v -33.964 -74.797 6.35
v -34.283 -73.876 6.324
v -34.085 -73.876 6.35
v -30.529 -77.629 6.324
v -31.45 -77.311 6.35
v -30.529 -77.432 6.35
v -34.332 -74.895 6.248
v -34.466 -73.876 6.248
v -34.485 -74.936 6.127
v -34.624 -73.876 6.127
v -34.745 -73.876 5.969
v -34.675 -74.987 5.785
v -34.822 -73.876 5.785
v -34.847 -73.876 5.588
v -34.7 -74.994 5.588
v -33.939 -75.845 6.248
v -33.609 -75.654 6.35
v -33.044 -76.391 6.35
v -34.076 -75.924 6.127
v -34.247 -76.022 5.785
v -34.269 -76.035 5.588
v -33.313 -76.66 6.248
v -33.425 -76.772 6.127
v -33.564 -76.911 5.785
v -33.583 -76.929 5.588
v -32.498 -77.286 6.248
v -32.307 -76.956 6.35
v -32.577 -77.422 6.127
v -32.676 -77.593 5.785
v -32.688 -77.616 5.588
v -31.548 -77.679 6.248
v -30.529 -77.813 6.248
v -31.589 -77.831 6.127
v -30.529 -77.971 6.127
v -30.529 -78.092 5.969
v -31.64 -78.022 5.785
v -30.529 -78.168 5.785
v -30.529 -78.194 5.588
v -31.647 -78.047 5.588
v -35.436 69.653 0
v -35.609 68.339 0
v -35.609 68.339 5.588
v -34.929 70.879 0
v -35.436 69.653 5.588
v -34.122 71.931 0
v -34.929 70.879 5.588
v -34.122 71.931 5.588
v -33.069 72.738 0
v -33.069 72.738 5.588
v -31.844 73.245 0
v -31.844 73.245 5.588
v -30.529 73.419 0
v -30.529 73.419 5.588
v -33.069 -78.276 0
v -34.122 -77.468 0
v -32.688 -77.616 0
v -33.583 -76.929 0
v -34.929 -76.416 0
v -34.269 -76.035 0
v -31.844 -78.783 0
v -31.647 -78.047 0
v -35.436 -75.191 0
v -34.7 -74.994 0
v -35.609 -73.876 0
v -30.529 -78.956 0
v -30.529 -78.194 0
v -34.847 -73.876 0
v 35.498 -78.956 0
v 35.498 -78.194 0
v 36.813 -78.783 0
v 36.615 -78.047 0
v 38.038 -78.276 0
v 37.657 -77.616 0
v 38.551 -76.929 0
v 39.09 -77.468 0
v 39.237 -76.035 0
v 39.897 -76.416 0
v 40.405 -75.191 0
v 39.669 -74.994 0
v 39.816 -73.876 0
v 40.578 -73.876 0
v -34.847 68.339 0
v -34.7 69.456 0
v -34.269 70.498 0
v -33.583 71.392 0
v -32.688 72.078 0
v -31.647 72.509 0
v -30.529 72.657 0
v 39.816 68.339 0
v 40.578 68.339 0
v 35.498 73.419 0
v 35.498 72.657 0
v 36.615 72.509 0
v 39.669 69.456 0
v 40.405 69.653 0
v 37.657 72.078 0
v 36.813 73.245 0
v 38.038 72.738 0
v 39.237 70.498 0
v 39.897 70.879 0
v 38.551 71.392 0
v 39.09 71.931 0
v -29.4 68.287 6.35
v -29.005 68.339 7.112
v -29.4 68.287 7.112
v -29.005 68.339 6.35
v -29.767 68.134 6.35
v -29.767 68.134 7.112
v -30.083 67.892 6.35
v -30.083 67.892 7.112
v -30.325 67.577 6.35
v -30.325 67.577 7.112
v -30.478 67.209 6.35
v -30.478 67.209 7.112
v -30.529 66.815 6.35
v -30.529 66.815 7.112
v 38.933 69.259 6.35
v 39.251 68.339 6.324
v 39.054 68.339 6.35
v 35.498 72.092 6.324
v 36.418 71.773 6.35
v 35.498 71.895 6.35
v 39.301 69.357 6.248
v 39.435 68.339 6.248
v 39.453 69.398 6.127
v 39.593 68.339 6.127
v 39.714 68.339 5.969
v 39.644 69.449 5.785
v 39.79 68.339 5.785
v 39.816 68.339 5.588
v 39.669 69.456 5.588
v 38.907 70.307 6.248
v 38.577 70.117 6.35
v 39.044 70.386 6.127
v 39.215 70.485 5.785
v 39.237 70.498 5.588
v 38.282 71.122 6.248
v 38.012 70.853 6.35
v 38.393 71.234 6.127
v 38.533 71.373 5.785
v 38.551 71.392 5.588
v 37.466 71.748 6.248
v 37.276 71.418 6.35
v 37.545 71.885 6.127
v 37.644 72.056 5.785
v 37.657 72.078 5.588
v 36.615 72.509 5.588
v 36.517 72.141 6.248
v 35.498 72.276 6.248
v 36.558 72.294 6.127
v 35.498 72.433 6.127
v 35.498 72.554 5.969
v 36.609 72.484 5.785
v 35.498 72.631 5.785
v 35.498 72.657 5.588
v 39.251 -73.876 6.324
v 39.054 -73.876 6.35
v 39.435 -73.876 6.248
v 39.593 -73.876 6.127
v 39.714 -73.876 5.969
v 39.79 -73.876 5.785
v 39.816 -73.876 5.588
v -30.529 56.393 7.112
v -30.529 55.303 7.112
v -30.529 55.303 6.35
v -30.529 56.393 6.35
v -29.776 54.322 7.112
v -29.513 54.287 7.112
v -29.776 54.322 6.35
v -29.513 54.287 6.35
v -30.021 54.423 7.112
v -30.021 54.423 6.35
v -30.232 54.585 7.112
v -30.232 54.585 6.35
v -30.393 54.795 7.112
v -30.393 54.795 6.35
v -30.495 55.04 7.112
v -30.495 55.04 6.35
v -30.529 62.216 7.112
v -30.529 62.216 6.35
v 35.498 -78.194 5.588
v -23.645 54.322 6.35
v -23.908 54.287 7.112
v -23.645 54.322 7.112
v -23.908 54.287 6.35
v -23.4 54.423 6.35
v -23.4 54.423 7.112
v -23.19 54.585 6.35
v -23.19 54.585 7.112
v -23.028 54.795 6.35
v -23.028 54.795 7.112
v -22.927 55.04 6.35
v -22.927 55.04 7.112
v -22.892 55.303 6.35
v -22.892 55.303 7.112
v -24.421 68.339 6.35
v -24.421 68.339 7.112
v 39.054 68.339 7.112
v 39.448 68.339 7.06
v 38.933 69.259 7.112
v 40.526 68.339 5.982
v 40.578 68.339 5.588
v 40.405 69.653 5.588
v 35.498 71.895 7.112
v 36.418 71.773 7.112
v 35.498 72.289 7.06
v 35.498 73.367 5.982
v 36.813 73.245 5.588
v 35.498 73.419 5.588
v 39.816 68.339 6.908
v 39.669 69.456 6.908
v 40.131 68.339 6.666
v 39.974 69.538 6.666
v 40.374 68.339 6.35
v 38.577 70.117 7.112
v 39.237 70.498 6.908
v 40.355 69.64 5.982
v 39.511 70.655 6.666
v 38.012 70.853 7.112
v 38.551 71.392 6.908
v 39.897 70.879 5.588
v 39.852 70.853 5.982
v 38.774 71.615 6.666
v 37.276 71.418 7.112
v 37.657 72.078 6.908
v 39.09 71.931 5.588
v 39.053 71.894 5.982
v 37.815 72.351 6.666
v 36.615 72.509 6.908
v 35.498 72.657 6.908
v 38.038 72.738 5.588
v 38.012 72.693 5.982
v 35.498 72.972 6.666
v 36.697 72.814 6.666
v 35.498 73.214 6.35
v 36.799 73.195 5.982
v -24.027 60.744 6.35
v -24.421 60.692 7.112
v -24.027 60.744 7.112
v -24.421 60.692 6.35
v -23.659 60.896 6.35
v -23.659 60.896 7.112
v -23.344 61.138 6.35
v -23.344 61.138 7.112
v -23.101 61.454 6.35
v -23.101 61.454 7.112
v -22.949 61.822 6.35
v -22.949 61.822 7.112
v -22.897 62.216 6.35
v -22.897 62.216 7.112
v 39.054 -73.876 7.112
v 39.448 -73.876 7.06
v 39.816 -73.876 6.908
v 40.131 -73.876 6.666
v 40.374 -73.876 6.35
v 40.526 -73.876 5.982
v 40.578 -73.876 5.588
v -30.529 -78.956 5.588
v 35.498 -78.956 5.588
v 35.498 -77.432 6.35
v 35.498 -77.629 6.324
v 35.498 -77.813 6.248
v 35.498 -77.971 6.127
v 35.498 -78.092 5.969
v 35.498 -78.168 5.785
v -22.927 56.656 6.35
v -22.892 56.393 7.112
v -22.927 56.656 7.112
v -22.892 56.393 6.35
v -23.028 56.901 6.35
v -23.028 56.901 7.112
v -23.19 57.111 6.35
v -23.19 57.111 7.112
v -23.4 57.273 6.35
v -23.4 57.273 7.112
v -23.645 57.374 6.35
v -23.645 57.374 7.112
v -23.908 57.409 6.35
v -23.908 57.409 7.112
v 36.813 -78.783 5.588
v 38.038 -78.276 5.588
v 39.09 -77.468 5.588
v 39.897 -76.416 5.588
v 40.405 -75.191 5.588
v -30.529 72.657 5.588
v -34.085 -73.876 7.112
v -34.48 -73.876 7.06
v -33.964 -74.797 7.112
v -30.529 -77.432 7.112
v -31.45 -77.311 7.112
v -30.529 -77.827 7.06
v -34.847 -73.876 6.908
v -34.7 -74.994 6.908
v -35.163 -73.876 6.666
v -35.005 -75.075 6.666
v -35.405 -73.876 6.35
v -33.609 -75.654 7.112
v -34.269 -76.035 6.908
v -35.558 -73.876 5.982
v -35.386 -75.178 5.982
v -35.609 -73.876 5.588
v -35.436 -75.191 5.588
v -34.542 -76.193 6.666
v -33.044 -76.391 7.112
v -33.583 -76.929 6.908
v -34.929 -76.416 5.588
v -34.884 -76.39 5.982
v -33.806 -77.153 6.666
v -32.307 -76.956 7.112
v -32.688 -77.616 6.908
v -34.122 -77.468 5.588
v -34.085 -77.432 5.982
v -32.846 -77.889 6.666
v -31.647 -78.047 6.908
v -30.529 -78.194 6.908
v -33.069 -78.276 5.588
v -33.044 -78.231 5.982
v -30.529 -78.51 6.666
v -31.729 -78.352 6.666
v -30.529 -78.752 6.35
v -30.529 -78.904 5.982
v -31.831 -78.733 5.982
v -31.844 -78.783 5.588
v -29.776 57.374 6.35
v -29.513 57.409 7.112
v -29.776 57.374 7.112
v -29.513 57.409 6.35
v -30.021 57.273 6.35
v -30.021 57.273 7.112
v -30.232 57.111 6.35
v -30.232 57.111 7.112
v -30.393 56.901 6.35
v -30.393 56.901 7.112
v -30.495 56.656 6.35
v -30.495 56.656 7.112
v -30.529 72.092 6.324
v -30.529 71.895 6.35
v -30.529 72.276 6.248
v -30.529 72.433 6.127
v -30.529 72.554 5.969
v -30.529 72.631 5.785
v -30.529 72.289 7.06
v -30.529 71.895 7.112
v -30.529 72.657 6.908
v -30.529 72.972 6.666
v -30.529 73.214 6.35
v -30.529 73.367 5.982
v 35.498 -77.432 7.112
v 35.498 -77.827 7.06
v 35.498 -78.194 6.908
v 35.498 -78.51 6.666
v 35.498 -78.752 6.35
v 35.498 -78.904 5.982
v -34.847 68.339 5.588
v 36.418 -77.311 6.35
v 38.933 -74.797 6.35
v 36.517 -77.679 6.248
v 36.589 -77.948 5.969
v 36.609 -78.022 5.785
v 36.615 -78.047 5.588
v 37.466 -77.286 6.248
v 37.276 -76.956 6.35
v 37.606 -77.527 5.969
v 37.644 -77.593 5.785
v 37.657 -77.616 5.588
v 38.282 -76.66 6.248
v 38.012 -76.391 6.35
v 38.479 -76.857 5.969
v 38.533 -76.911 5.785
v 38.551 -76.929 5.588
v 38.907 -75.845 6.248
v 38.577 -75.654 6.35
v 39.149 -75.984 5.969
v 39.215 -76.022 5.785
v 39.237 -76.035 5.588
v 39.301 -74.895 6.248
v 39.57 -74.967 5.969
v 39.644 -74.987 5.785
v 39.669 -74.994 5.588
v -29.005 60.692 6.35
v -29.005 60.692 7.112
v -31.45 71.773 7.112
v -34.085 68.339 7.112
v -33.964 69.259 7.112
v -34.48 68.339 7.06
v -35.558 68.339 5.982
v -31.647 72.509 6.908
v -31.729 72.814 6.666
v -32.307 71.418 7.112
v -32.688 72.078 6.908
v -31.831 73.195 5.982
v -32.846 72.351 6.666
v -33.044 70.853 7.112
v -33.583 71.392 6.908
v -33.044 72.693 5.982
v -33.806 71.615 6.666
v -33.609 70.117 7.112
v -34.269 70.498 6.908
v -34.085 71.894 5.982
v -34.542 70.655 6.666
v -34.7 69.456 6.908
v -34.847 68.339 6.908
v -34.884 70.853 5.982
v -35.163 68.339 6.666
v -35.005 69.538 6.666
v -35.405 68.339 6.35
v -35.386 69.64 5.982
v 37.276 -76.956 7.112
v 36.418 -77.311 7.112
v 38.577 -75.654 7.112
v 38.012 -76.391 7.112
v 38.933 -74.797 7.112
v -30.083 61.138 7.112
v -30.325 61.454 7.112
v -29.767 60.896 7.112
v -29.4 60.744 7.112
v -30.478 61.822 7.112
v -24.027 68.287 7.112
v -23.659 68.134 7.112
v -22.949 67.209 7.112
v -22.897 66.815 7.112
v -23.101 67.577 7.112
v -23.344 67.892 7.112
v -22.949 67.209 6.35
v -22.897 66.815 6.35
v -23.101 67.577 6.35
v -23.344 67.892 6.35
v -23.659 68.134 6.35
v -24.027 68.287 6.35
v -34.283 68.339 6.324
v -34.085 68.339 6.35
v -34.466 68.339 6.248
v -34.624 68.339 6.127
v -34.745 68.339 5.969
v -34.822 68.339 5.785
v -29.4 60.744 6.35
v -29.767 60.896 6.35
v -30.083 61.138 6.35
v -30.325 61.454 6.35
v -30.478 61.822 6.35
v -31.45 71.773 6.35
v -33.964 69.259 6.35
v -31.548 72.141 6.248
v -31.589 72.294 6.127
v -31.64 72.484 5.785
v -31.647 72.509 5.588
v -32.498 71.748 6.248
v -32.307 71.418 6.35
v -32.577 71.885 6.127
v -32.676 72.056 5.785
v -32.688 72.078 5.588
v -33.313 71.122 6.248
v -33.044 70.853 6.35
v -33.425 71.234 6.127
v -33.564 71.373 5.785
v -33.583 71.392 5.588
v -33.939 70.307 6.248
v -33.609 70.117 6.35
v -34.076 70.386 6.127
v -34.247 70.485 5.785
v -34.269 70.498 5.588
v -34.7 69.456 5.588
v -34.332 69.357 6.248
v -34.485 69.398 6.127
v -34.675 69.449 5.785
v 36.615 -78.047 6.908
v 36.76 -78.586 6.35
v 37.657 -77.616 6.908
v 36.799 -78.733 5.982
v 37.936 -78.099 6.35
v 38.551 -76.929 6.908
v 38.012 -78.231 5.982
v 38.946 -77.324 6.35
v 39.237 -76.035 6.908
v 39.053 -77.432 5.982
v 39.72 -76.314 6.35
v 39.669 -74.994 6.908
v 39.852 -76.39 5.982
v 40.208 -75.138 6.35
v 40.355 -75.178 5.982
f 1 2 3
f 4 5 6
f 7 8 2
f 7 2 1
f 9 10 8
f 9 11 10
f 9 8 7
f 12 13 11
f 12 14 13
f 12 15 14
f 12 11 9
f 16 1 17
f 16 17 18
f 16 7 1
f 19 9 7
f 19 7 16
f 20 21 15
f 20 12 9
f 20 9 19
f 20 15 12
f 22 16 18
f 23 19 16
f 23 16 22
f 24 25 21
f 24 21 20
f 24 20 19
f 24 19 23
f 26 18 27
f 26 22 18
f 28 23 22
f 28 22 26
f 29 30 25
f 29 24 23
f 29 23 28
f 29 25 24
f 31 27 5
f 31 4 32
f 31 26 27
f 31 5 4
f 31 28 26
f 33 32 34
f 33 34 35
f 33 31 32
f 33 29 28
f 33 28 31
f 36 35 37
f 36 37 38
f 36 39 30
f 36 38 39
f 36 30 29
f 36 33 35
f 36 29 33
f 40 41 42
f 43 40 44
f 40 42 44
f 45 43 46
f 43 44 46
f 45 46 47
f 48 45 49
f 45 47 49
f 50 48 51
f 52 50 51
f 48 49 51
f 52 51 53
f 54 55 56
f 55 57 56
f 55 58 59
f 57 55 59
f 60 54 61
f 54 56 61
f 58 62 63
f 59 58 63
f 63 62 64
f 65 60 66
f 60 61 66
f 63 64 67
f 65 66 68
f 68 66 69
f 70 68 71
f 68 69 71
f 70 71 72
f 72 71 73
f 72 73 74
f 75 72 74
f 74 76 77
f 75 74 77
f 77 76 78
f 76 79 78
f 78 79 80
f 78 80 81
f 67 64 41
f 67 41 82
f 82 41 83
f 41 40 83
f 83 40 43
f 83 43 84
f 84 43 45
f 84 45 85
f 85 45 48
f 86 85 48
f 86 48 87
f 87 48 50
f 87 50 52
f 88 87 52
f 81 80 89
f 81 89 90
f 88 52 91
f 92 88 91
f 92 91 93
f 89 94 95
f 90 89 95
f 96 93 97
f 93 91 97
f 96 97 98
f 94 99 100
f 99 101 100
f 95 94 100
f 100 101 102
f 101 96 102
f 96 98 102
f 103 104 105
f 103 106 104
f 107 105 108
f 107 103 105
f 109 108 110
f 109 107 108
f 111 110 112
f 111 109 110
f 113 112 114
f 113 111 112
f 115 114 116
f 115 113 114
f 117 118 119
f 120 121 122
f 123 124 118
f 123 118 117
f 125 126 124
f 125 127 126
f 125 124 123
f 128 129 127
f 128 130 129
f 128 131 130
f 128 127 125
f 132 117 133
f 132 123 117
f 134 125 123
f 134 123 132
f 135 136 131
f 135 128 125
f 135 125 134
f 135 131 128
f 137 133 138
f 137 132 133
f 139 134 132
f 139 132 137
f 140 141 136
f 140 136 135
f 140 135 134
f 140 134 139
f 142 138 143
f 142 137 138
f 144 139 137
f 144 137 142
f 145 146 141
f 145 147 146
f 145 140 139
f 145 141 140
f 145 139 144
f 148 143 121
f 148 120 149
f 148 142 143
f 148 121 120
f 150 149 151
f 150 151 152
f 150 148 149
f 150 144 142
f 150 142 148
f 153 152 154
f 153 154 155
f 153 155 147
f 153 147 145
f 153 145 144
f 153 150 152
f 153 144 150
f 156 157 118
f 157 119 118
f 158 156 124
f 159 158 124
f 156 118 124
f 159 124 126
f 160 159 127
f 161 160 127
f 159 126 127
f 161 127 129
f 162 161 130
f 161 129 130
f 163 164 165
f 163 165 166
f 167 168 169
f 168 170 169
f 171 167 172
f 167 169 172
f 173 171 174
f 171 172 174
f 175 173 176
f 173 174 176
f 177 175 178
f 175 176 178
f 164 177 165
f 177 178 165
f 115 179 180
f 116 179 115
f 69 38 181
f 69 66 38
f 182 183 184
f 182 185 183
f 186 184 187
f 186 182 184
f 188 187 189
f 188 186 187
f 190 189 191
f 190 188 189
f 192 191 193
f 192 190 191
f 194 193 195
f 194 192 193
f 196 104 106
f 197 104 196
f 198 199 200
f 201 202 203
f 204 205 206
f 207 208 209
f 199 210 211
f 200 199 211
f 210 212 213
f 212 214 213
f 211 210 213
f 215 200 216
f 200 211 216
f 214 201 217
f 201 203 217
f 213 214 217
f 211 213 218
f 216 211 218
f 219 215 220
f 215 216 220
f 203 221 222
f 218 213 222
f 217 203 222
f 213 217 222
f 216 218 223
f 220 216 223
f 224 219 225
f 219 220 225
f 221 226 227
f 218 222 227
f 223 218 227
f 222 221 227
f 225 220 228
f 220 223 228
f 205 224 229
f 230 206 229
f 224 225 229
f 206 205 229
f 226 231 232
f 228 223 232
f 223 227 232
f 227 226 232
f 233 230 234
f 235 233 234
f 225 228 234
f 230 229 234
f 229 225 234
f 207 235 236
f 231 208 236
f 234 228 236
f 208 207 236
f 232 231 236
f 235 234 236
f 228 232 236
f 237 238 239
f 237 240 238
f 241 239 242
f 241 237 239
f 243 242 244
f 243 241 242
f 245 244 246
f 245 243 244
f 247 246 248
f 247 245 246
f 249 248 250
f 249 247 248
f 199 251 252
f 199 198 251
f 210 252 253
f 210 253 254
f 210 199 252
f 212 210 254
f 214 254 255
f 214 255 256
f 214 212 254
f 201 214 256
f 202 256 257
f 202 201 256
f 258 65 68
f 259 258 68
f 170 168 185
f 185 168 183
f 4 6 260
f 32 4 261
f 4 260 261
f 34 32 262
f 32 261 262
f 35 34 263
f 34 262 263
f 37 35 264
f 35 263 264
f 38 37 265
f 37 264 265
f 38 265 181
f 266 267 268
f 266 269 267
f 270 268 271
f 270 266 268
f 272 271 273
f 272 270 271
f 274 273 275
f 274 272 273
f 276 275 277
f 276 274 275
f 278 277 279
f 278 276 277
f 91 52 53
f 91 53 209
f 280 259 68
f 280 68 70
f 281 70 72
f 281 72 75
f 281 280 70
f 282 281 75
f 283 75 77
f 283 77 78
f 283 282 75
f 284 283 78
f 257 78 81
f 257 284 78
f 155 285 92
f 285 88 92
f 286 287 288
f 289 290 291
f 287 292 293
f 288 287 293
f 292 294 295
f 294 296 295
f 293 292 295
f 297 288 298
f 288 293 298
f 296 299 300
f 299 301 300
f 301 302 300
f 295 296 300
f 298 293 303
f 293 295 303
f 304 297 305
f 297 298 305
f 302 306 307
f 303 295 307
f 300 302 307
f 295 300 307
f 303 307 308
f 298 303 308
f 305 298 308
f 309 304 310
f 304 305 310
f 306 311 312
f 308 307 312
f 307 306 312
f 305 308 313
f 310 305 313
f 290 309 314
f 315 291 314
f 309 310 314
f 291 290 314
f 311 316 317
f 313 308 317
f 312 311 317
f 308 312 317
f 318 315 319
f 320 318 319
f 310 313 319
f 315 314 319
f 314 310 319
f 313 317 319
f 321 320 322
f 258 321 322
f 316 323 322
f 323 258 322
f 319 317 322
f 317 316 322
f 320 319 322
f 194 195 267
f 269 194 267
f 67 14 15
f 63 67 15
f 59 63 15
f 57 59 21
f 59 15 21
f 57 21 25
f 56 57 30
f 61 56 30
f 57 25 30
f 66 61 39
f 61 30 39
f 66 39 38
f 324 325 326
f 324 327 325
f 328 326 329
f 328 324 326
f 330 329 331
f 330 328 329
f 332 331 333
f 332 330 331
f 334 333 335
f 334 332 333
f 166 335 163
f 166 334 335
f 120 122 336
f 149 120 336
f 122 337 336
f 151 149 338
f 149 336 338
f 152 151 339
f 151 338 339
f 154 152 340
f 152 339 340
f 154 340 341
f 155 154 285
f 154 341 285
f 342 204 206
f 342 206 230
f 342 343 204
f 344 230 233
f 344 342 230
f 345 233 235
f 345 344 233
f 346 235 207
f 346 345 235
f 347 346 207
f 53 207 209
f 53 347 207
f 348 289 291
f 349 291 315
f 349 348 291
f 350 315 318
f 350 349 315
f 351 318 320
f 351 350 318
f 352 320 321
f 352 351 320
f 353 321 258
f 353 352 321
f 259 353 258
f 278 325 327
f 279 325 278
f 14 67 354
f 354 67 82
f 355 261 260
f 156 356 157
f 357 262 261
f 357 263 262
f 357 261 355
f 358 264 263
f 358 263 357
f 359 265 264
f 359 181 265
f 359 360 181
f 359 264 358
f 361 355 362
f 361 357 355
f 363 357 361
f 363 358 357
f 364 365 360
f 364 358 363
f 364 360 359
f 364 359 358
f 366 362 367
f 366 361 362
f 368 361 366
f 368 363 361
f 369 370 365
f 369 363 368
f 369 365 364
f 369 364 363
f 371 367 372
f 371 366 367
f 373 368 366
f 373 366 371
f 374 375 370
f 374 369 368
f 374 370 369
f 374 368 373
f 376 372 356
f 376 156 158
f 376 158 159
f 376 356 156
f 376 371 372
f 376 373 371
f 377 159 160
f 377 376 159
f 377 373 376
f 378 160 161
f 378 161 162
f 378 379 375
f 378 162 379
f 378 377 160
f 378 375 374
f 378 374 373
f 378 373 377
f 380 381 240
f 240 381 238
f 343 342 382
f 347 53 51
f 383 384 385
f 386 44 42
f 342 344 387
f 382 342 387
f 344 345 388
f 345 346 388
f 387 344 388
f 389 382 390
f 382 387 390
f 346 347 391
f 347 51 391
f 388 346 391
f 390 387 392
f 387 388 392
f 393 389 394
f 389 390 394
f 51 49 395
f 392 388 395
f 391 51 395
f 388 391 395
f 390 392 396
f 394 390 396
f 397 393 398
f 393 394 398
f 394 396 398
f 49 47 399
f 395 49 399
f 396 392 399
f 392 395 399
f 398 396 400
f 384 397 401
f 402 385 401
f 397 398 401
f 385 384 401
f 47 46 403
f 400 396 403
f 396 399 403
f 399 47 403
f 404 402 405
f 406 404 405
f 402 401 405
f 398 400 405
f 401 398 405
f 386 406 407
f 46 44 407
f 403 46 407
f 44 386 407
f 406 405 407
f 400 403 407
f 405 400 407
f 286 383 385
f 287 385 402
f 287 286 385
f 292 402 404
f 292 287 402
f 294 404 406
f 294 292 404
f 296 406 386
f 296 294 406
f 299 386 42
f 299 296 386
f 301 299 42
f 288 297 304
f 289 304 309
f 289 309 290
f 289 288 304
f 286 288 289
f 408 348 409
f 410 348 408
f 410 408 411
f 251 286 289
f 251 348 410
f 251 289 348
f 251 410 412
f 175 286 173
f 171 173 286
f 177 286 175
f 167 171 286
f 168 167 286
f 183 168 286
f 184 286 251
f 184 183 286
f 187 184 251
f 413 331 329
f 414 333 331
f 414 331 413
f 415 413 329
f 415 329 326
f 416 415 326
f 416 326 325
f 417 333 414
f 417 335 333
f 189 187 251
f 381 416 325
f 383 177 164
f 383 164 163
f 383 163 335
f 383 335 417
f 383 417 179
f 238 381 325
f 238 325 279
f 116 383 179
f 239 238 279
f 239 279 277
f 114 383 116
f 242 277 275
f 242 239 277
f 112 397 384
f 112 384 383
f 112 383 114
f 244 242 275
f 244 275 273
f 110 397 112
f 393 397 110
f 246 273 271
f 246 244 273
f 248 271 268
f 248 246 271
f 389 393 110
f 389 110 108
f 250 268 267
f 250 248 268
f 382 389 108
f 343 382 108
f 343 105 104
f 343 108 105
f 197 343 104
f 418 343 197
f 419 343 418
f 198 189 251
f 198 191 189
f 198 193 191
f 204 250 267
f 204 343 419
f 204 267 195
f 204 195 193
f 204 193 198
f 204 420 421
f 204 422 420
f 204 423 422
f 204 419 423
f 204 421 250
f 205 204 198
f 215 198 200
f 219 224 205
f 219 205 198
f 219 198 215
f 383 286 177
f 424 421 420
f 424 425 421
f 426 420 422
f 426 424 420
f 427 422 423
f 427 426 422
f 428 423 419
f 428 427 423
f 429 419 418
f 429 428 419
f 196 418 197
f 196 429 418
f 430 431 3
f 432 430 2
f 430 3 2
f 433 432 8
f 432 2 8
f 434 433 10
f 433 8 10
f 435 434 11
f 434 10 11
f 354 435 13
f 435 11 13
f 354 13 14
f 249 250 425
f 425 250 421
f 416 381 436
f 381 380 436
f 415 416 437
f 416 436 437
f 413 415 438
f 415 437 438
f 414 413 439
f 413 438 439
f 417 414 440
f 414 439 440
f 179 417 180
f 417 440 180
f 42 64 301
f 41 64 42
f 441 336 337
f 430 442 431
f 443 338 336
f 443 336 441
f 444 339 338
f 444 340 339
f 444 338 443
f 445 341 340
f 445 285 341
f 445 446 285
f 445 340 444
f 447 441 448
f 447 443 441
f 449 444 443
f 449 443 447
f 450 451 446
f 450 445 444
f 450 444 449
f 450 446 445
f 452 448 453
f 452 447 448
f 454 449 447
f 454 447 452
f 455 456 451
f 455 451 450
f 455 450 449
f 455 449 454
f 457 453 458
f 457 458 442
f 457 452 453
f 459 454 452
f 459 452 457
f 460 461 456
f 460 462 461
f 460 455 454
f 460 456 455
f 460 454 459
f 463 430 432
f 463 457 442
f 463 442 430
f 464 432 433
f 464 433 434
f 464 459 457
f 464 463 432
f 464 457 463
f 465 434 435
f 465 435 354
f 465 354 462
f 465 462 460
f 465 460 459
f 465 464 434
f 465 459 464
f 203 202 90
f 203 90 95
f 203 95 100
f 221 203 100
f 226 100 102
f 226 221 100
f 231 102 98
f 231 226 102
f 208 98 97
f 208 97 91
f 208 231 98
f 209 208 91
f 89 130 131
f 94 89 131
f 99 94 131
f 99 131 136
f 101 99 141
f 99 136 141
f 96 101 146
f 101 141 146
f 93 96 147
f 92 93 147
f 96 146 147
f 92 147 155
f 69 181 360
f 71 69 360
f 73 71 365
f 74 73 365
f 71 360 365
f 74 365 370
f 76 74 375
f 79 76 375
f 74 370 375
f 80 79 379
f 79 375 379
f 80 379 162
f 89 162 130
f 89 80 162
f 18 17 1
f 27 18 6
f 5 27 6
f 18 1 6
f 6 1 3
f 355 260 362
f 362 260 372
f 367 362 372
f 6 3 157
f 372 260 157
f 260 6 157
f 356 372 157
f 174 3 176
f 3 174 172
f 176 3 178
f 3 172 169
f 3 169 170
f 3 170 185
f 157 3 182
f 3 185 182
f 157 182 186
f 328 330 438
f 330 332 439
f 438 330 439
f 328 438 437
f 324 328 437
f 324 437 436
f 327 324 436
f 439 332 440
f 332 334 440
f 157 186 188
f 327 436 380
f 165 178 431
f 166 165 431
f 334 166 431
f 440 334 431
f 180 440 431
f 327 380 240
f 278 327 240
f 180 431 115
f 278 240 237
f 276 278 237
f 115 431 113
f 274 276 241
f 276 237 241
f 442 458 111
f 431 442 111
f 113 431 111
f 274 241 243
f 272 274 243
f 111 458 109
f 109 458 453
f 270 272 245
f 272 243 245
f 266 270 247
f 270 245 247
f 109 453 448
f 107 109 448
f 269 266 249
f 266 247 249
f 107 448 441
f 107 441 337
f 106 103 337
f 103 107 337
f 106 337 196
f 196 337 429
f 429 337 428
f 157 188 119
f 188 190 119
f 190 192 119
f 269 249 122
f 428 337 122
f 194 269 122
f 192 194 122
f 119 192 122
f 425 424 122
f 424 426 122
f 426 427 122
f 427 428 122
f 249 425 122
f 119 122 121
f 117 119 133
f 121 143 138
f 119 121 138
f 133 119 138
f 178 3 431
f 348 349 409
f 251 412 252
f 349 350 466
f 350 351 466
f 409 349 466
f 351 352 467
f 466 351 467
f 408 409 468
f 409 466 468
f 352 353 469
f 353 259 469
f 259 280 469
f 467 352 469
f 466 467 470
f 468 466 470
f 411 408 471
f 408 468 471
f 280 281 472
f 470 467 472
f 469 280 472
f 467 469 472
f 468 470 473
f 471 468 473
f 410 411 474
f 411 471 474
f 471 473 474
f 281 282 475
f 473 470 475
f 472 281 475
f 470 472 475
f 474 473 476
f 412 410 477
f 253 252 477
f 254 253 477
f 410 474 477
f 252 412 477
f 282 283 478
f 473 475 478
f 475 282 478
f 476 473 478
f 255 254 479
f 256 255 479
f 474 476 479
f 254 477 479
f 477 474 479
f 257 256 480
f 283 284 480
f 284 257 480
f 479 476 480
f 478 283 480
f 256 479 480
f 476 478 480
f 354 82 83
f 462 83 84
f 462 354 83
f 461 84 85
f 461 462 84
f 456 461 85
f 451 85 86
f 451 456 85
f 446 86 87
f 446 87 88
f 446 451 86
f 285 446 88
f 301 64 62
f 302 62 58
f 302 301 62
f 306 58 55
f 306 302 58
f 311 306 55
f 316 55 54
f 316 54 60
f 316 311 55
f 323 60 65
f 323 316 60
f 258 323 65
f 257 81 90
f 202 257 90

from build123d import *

# Parameters (mm, degrees)
F0_W     = 76.187346
F0_H     = 152.374692
F1_DEPTH = 7.112
F2_R     = 5.08
F3_R     = 1.524
F4_T     = -0.762
F5_W     = 7.632177
F5_H     = 7.64653
F6_DEPTH = 25.4
F7_R     = 1.524
F8_W     = 7.637478
F8_H     = 3.121578
F9_DEPTH = 25.4
F10_R    = 1.016


with BuildPart() as f1:
    # F0 (on Top) → F1 (new body)
    with BuildSketch(Plane.XY):
        with Locations((2.484182, -2.768833)):
            Rectangle(F0_W, F0_H)
    extrude(amount=F1_DEPTH)

    # F2
    f2_edges = [f1.edges().sort_by_distance(p)[0] for p in [
        (40.577855, -78.956179, 3.556),
        (-35.609491, -78.956179, 3.556),
        (-35.609491, 73.418513, 3.556),
        (40.577855, 73.418513, 3.556),
    ]]
    fillet(f2_edges, radius=F2_R)

    # F3
    f3_edges = [f1.edges().sort_by_distance(p)[0] for p in [
        (40.577855, -2.768833, 7.112),
        (-35.609491, -2.768833, 7.112),
    ]]
    fillet(f3_edges, radius=F3_R)

    # F4
    f4_openings = [f1.faces().sort_by_distance(p)[0] for p in [
        (2.484182, -2.768833, 0),
    ]]
    offset(amount=F4_T, openings=f4_openings)

    # F5 (on face) → F6 (cut)
    with BuildSketch(Plane.XY.offset(7.112)):
        with Locations((-26.713403, 64.515248)):
            Rectangle(F5_W, F5_H)
    extrude(amount=-F6_DEPTH, mode=Mode.SUBTRACT)

    # F7
    f7_edges = [f1.edges().sort_by_distance(p)[0] for p in [
        (-22.897314, 60.691983, 6.731),
        (-30.529491, 60.691983, 6.731),
        (-22.897314, 68.338513, 6.731),
        (-30.529491, 68.338513, 6.731),
    ]]
    fillet(f7_edges, radius=F7_R)

    # F8 (on face) → F9 (cut)
    with BuildSketch(Plane.XY.offset(7.112)):
        with Locations((-26.710752, 55.848118)):
            Rectangle(F8_W, F8_H)
    extrude(amount=-F9_DEPTH, mode=Mode.SUBTRACT)

    # F10
    f10_edges = [f1.edges().sort_by_distance(p)[0] for p in [
        (-30.529491, 54.287329, 6.731),
        (-22.892013, 54.287329, 6.731),
        (-30.529491, 57.408907, 6.731),
        (-22.892013, 57.408907, 6.731),
    ]]
    fillet(f10_edges, radius=F10_R)


solid = f1.part
